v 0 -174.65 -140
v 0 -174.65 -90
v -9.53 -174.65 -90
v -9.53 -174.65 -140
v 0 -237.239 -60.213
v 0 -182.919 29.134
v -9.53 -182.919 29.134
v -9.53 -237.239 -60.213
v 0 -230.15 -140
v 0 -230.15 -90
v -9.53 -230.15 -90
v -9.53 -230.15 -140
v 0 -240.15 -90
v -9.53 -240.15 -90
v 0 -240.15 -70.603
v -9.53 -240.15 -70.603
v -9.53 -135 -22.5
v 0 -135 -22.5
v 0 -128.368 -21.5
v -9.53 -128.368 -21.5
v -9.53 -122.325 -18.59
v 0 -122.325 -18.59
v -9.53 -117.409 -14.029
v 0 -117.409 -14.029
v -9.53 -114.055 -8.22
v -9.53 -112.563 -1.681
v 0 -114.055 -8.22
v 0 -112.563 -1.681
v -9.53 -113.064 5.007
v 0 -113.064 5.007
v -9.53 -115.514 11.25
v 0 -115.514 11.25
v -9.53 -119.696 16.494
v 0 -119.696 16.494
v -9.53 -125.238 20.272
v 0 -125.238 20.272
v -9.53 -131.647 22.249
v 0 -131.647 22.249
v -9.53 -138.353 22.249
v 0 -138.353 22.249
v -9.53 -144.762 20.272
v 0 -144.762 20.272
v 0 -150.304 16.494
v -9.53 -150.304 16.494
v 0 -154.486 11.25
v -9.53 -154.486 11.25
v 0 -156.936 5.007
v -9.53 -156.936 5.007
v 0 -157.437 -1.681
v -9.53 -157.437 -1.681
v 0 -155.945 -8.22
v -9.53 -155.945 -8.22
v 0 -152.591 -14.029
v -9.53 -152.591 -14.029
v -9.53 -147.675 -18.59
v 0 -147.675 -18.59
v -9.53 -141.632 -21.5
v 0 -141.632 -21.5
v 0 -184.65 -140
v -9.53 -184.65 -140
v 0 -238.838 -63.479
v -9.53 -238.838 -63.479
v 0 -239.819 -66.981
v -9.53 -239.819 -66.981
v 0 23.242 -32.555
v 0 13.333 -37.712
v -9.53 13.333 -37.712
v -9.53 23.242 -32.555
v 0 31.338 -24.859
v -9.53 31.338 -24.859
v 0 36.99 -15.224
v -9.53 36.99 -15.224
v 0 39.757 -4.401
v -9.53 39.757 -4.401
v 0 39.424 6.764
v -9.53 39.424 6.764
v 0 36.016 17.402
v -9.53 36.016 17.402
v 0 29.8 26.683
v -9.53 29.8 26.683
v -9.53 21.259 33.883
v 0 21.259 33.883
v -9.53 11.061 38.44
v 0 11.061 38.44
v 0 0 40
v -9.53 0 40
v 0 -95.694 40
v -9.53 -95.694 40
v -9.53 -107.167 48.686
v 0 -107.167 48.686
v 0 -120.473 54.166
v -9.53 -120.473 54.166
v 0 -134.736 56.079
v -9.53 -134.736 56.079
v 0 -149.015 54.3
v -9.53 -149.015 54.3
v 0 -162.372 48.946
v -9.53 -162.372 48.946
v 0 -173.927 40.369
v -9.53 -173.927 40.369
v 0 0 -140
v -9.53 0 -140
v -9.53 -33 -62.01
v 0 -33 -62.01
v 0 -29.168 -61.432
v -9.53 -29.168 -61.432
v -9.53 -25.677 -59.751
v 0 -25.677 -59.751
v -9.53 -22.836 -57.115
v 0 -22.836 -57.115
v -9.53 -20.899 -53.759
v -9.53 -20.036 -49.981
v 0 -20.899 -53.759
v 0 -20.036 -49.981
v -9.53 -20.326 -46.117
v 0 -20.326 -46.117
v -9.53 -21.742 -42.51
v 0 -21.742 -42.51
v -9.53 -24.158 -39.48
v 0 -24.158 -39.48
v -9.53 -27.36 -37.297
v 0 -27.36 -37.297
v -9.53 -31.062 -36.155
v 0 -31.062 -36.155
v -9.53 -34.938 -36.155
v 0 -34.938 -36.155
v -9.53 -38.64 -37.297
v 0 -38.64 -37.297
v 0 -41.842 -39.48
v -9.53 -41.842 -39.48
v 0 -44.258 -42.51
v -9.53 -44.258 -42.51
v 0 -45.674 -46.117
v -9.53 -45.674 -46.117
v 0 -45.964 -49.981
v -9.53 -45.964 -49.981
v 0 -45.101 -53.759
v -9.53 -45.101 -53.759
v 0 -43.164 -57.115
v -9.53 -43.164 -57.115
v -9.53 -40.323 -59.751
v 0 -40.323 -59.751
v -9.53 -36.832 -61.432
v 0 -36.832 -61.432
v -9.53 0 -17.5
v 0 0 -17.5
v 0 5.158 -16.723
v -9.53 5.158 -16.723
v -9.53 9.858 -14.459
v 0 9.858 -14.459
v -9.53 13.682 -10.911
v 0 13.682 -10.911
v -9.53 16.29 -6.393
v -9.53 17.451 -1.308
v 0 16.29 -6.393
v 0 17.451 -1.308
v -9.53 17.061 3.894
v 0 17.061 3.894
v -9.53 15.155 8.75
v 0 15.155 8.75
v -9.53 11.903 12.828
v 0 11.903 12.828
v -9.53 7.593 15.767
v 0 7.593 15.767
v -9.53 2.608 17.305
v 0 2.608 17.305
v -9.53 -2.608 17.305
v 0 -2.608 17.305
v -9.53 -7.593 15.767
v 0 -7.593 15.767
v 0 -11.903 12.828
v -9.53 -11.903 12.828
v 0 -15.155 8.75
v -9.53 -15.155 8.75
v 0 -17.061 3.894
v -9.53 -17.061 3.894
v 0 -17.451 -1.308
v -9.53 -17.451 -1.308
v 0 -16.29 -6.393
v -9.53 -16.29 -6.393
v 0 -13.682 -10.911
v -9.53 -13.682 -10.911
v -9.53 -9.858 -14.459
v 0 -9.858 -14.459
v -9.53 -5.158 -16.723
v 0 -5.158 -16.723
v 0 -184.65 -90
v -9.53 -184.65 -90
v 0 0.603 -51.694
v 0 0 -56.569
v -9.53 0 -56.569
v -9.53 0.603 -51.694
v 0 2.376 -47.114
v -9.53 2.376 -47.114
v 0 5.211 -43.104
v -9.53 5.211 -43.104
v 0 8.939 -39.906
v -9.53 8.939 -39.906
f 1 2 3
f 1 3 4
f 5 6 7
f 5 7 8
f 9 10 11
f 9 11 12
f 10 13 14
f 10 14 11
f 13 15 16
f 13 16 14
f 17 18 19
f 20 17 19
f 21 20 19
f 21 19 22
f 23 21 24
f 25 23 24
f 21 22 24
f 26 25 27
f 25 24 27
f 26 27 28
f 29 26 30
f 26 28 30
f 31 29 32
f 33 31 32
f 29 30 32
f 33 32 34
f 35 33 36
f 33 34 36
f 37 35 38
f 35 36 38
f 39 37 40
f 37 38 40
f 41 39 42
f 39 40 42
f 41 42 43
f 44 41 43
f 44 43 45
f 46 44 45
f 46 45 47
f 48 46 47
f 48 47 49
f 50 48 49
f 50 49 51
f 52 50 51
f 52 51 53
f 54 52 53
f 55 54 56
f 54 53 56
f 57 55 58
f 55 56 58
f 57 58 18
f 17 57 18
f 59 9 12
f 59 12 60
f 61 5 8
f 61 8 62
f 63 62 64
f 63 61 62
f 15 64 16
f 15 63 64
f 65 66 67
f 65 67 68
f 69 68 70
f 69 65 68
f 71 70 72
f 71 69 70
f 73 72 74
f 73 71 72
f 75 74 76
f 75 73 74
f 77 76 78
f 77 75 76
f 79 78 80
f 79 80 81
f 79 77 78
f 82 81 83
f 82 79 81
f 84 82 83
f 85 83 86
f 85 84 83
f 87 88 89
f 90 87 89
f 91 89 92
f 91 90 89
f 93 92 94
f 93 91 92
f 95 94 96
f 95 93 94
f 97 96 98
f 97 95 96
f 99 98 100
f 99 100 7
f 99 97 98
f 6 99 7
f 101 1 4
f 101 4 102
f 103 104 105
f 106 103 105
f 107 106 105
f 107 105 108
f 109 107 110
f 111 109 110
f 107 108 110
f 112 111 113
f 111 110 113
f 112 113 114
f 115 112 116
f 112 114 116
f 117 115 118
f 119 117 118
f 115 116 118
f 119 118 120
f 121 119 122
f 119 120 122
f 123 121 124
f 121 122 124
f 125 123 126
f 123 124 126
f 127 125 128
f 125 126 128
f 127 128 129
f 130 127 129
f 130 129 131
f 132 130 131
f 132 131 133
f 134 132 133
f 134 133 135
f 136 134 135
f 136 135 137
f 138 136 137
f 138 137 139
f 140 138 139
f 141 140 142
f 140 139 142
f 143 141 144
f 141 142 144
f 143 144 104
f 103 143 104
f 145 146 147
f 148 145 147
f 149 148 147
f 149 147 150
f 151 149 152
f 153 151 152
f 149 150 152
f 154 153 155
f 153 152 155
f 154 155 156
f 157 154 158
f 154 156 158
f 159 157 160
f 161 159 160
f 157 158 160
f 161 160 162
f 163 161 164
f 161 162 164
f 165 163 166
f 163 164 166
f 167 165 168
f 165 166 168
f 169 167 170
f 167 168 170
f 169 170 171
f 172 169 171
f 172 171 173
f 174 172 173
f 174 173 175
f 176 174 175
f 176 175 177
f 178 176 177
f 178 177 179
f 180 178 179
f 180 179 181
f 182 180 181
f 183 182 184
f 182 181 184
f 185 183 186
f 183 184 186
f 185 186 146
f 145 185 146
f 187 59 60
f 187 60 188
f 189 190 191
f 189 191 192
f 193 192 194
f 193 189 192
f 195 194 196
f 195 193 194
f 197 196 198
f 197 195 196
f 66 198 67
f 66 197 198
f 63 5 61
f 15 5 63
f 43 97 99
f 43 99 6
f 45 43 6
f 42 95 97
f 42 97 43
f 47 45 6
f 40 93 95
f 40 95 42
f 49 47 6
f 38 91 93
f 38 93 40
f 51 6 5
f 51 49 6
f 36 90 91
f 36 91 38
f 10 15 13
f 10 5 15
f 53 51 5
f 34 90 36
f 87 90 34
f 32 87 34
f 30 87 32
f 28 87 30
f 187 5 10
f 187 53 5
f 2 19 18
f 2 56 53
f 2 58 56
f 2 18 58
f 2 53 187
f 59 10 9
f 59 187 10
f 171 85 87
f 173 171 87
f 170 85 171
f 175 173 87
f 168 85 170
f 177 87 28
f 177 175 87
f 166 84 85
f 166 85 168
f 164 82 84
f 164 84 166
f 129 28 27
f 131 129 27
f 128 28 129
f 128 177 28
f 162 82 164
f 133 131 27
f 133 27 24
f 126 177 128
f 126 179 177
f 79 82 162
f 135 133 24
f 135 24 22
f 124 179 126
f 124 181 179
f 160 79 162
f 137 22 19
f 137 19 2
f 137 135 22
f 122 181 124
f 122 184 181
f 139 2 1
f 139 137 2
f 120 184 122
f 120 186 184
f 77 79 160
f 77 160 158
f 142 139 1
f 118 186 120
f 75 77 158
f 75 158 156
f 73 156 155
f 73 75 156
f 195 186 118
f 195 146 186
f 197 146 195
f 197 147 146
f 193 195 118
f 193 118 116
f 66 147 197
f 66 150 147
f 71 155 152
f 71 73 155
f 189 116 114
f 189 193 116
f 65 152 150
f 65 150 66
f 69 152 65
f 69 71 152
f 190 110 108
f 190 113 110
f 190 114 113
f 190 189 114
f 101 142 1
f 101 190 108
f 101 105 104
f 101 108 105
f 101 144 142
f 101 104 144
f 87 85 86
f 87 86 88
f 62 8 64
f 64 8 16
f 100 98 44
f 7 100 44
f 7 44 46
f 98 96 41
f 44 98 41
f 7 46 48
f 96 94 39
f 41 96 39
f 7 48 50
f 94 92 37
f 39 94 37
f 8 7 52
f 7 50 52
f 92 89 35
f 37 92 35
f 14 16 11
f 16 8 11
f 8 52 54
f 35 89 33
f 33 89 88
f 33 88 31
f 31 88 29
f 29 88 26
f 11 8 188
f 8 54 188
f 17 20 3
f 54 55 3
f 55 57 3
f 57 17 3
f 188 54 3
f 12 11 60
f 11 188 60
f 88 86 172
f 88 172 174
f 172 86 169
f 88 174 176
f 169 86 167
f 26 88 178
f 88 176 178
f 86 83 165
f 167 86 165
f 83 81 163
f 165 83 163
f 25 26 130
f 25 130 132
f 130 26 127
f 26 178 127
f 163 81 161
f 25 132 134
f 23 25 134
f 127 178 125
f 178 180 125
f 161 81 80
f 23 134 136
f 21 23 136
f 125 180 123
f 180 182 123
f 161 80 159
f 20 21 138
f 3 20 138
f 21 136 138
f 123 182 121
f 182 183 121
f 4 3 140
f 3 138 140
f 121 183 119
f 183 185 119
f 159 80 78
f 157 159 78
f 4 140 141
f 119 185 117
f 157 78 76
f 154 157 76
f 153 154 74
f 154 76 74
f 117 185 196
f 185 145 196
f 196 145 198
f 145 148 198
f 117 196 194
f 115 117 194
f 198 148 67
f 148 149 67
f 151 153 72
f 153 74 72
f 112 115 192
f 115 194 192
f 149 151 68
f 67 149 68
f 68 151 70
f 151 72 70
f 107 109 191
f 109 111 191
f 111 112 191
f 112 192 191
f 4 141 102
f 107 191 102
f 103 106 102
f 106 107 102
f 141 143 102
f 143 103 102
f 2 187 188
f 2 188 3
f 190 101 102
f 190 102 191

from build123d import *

# Parameters (mm, degrees)
ESBO_O1_R          = 17.5
ESBO_O1_R_2        = 22.5
ESBO_O1_R_3        = 13
FLANGE_BASE1_DEPTH = 9.53


# Sheet-metal steps are written as plain solids
with BuildPart() as part:
    # Esboço1 → Flange-base1 (new body)
    with BuildSketch(Plane(origin=(0, 0, 0), x_dir=(0, 0, -1), z_dir=(1, 0, 0))):
        with BuildLine():
            Line((-40, 0), (-40, -95.693939399))
            ThreePointArc((-40, -95.693939399), (-55.649819015, -141.93282364), (-29.1335895, -182.918684903))
            Line((-29.1335895, -182.918684903), (60.212673691, -237.239402604))
            ThreePointArc((60.212673691, -237.239402604), (65.207688943, -239.408609141), (70.602684212, -240.15))
            Line((70.602684212, -240.15), (90, -240.15))
            Line((90, -240.15), (90, -230.15))
            Line((90, -230.15), (140, -230.15))
            Line((140, -230.15), (140, -184.65))
            Line((140, -184.65), (90, -184.65))
            Line((90, -184.65), (90, -174.65))
            Line((90, -174.65), (140, -174.65))
            Line((140, -174.65), (140, 0))
            Line((140, 0), (56.568542495, 0))
            ThreePointArc((56.568542495, 0), (45.021537111, 3.670068381), (37.712361663, 13.333333333))
            ThreePointArc((37.712361663, 13.333333333), (-6.764079149, 39.423942386), (-40, 0))
        make_face()
        Circle(ESBO_O1_R, mode=Mode.SUBTRACT)
        with Locations((0, -135)):
            Circle(ESBO_O1_R_2, mode=Mode.SUBTRACT)
        with Locations((49.01, -33)):
            Circle(ESBO_O1_R_3, mode=Mode.SUBTRACT)
    extrude(amount=-FLANGE_BASE1_DEPTH)


solid = part.part
